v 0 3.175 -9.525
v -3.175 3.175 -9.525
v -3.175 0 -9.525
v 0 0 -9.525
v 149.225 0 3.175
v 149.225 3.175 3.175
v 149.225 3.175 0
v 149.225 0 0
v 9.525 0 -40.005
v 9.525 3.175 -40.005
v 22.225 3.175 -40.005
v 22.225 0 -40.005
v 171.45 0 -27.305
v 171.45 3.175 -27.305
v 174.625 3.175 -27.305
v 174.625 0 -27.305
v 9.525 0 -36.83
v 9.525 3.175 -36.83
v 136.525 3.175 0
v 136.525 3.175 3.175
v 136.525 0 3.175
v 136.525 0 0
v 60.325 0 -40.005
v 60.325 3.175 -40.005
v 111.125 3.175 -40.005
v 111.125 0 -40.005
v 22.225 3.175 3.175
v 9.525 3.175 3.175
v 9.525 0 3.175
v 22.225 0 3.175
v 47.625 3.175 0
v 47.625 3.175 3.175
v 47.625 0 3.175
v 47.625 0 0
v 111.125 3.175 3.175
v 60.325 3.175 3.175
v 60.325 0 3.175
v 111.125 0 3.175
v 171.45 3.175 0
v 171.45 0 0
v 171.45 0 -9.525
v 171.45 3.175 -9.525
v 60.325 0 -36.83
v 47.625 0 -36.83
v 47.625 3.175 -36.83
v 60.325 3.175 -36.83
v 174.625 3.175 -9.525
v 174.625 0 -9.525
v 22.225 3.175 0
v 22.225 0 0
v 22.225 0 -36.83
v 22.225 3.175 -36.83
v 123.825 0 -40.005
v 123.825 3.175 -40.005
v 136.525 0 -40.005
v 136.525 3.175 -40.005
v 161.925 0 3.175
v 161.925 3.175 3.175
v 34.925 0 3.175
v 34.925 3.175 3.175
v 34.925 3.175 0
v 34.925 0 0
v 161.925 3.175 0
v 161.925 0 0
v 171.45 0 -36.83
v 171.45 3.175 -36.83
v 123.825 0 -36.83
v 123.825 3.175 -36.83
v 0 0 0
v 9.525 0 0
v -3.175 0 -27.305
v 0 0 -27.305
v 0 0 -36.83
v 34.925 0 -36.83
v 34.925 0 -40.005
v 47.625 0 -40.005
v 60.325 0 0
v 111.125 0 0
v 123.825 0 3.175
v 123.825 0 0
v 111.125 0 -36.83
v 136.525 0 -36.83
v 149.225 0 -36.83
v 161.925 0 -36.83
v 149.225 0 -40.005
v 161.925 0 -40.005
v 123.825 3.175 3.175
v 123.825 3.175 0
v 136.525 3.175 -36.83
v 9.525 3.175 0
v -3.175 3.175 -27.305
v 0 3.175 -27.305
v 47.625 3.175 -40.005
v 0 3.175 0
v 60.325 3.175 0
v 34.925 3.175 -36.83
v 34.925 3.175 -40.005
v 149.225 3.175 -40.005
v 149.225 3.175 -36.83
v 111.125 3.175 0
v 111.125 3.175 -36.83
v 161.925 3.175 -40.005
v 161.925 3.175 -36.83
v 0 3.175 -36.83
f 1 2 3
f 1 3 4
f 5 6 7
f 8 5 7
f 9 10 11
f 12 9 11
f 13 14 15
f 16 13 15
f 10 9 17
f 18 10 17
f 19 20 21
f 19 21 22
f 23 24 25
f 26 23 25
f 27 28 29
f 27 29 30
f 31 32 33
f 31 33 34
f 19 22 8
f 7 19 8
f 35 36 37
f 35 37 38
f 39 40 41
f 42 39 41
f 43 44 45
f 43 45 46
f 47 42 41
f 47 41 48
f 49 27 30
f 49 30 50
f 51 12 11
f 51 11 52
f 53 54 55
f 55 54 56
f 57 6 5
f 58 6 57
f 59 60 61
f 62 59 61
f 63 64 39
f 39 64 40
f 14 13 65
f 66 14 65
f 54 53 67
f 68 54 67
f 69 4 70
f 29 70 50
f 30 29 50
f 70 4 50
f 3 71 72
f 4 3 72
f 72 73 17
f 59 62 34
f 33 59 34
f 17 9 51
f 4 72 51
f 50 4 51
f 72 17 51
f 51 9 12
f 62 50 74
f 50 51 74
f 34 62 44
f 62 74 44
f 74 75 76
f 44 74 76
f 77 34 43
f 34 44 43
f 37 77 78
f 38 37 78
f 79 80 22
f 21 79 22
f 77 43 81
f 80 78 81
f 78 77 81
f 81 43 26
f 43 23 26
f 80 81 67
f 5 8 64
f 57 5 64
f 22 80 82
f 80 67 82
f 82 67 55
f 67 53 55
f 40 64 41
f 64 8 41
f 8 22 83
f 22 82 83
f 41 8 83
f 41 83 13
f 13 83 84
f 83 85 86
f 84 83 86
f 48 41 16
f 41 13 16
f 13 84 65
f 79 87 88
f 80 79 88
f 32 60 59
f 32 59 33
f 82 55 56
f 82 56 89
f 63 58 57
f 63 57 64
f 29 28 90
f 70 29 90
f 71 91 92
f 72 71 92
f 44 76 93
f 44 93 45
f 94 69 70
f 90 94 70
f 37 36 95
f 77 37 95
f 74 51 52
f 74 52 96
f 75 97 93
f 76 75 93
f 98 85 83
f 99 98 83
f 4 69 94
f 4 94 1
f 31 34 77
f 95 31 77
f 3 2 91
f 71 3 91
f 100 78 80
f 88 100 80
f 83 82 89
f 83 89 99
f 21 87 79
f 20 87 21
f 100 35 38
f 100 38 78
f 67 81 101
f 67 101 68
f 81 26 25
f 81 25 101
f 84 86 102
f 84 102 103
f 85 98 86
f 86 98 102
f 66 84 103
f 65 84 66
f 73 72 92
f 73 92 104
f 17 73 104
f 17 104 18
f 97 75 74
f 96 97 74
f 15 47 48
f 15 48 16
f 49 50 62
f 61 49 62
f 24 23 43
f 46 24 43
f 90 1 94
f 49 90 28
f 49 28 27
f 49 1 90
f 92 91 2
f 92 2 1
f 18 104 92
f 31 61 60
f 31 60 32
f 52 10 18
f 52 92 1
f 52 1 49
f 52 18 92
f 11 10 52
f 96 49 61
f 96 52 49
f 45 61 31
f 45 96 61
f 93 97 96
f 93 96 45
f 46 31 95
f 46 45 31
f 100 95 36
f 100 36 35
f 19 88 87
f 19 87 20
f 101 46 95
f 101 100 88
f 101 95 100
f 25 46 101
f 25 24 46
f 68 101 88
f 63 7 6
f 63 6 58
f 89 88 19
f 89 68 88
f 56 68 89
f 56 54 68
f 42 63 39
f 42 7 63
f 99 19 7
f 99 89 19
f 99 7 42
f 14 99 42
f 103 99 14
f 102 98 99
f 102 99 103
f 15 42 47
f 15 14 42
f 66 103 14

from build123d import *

# Parameters (mm, degrees)
SKETCH1_W           = 171.45
SKETCH1_H           = 36.83
BOSS_EXTRUDE1_DEPTH = 3.175
SKETCH2_W           = 12.7
SKETCH2_H           = 3.175
SKETCH2_W_2         = 50.8
BOSS_EXTRUDE2_DEPTH = 3.175
SKETCH3_W           = 42.418
SKETCH3_H           = 12.7
CUT_EXTRUDE1_DEPTH  = 3.175
SKETCH5_W           = 17.018
SKETCH5_H           = 12.7
BOSS_EXTRUDE3_DEPTH = 3.175
SKETCH6_W           = 3.175
SKETCH6_H           = 17.78
BOSS_EXTRUDE4_DEPTH = 3.175
SKETCH7_W           = 59.348335251
SKETCH7_H           = 25.17302984
BOSS_EXTRUDE5_DEPTH = 3.175


with BuildPart() as part:
    # Sketch1 → Boss-Extrude1 (new body)
    with BuildSketch(Plane(origin=(0, 0, 0), x_dir=(1, 0, 0), z_dir=(0, 1, 0))):
        with Locations((85.725, 18.415)):
            Rectangle(SKETCH1_W, SKETCH1_H)
    extrude(amount=BOSS_EXTRUDE1_DEPTH)

    # Sketch2 → Boss-Extrude2 (add)
    with BuildSketch(Plane(origin=(0, 3.175, 0), x_dir=(1, 0, 0), z_dir=(0, 1, 0))):
        with Locations((15.875, -1.5875)):
            Rectangle(SKETCH2_W, SKETCH2_H)
        with Locations((41.275, -1.5875)):
            Rectangle(SKETCH2_W, SKETCH2_H)
        with Locations((85.725, -1.5875)):
            Rectangle(SKETCH2_W_2, SKETCH2_H)
        with Locations((130.175, -1.5875)):
            Rectangle(SKETCH2_W, SKETCH2_H)
        with Locations((155.575, -1.5875)):
            Rectangle(SKETCH2_W, SKETCH2_H)
    boss_extrude2 = extrude(amount=-BOSS_EXTRUDE2_DEPTH)

    # Sketch3 → Cut-Extrude1 (cut)
    with BuildSketch(Plane(origin=(0, 3.175, 0), x_dir=(1, 0, 0), z_dir=(0, 1, 0))):
        with Locations((88.646, 9.525)):
            Rectangle(SKETCH3_W, SKETCH3_H)
    extrude(amount=-CUT_EXTRUDE1_DEPTH, mode=Mode.SUBTRACT)

    # Sketch5 → Boss-Extrude3 (add)
    with BuildSketch(Plane(origin=(0, 3.175, 0), x_dir=(1, 0, 0), z_dir=(0, 1, 0))):
        with Locations((89.916, 9.525)):
            Rectangle(SKETCH5_W, SKETCH5_H)
    extrude(amount=-BOSS_EXTRUDE3_DEPTH)

    # Sketch6 → Boss-Extrude4 (add)
    with BuildSketch(Plane(origin=(0, 3.175, 0), x_dir=(1, 0, 0), z_dir=(0, 1, 0))):
        with Locations((-1.5875, 18.415)):
            Rectangle(SKETCH6_W, SKETCH6_H)
        with Locations((173.0375, 18.415)):
            Rectangle(SKETCH6_W, SKETCH6_H)
    extrude(amount=-BOSS_EXTRUDE4_DEPTH)

    # Mirror1: Boss-Extrude2 across plane
    add(boss_extrude2.mirror(Plane(origin=(0, 0, -18.415), x_dir=(1, 0, 0), z_dir=(0, 0, -1))))

    # Sketch7 → Boss-Extrude5 (add)
    with BuildSketch(Plane(origin=(0, 3.175, 0), x_dir=(1, 0, 0), z_dir=(0, 1, 0))):
        with Locations((85.808354404, 13.913862214)):
            Rectangle(SKETCH7_W, SKETCH7_H)
    extrude(amount=-BOSS_EXTRUDE5_DEPTH)


solid = part.part
